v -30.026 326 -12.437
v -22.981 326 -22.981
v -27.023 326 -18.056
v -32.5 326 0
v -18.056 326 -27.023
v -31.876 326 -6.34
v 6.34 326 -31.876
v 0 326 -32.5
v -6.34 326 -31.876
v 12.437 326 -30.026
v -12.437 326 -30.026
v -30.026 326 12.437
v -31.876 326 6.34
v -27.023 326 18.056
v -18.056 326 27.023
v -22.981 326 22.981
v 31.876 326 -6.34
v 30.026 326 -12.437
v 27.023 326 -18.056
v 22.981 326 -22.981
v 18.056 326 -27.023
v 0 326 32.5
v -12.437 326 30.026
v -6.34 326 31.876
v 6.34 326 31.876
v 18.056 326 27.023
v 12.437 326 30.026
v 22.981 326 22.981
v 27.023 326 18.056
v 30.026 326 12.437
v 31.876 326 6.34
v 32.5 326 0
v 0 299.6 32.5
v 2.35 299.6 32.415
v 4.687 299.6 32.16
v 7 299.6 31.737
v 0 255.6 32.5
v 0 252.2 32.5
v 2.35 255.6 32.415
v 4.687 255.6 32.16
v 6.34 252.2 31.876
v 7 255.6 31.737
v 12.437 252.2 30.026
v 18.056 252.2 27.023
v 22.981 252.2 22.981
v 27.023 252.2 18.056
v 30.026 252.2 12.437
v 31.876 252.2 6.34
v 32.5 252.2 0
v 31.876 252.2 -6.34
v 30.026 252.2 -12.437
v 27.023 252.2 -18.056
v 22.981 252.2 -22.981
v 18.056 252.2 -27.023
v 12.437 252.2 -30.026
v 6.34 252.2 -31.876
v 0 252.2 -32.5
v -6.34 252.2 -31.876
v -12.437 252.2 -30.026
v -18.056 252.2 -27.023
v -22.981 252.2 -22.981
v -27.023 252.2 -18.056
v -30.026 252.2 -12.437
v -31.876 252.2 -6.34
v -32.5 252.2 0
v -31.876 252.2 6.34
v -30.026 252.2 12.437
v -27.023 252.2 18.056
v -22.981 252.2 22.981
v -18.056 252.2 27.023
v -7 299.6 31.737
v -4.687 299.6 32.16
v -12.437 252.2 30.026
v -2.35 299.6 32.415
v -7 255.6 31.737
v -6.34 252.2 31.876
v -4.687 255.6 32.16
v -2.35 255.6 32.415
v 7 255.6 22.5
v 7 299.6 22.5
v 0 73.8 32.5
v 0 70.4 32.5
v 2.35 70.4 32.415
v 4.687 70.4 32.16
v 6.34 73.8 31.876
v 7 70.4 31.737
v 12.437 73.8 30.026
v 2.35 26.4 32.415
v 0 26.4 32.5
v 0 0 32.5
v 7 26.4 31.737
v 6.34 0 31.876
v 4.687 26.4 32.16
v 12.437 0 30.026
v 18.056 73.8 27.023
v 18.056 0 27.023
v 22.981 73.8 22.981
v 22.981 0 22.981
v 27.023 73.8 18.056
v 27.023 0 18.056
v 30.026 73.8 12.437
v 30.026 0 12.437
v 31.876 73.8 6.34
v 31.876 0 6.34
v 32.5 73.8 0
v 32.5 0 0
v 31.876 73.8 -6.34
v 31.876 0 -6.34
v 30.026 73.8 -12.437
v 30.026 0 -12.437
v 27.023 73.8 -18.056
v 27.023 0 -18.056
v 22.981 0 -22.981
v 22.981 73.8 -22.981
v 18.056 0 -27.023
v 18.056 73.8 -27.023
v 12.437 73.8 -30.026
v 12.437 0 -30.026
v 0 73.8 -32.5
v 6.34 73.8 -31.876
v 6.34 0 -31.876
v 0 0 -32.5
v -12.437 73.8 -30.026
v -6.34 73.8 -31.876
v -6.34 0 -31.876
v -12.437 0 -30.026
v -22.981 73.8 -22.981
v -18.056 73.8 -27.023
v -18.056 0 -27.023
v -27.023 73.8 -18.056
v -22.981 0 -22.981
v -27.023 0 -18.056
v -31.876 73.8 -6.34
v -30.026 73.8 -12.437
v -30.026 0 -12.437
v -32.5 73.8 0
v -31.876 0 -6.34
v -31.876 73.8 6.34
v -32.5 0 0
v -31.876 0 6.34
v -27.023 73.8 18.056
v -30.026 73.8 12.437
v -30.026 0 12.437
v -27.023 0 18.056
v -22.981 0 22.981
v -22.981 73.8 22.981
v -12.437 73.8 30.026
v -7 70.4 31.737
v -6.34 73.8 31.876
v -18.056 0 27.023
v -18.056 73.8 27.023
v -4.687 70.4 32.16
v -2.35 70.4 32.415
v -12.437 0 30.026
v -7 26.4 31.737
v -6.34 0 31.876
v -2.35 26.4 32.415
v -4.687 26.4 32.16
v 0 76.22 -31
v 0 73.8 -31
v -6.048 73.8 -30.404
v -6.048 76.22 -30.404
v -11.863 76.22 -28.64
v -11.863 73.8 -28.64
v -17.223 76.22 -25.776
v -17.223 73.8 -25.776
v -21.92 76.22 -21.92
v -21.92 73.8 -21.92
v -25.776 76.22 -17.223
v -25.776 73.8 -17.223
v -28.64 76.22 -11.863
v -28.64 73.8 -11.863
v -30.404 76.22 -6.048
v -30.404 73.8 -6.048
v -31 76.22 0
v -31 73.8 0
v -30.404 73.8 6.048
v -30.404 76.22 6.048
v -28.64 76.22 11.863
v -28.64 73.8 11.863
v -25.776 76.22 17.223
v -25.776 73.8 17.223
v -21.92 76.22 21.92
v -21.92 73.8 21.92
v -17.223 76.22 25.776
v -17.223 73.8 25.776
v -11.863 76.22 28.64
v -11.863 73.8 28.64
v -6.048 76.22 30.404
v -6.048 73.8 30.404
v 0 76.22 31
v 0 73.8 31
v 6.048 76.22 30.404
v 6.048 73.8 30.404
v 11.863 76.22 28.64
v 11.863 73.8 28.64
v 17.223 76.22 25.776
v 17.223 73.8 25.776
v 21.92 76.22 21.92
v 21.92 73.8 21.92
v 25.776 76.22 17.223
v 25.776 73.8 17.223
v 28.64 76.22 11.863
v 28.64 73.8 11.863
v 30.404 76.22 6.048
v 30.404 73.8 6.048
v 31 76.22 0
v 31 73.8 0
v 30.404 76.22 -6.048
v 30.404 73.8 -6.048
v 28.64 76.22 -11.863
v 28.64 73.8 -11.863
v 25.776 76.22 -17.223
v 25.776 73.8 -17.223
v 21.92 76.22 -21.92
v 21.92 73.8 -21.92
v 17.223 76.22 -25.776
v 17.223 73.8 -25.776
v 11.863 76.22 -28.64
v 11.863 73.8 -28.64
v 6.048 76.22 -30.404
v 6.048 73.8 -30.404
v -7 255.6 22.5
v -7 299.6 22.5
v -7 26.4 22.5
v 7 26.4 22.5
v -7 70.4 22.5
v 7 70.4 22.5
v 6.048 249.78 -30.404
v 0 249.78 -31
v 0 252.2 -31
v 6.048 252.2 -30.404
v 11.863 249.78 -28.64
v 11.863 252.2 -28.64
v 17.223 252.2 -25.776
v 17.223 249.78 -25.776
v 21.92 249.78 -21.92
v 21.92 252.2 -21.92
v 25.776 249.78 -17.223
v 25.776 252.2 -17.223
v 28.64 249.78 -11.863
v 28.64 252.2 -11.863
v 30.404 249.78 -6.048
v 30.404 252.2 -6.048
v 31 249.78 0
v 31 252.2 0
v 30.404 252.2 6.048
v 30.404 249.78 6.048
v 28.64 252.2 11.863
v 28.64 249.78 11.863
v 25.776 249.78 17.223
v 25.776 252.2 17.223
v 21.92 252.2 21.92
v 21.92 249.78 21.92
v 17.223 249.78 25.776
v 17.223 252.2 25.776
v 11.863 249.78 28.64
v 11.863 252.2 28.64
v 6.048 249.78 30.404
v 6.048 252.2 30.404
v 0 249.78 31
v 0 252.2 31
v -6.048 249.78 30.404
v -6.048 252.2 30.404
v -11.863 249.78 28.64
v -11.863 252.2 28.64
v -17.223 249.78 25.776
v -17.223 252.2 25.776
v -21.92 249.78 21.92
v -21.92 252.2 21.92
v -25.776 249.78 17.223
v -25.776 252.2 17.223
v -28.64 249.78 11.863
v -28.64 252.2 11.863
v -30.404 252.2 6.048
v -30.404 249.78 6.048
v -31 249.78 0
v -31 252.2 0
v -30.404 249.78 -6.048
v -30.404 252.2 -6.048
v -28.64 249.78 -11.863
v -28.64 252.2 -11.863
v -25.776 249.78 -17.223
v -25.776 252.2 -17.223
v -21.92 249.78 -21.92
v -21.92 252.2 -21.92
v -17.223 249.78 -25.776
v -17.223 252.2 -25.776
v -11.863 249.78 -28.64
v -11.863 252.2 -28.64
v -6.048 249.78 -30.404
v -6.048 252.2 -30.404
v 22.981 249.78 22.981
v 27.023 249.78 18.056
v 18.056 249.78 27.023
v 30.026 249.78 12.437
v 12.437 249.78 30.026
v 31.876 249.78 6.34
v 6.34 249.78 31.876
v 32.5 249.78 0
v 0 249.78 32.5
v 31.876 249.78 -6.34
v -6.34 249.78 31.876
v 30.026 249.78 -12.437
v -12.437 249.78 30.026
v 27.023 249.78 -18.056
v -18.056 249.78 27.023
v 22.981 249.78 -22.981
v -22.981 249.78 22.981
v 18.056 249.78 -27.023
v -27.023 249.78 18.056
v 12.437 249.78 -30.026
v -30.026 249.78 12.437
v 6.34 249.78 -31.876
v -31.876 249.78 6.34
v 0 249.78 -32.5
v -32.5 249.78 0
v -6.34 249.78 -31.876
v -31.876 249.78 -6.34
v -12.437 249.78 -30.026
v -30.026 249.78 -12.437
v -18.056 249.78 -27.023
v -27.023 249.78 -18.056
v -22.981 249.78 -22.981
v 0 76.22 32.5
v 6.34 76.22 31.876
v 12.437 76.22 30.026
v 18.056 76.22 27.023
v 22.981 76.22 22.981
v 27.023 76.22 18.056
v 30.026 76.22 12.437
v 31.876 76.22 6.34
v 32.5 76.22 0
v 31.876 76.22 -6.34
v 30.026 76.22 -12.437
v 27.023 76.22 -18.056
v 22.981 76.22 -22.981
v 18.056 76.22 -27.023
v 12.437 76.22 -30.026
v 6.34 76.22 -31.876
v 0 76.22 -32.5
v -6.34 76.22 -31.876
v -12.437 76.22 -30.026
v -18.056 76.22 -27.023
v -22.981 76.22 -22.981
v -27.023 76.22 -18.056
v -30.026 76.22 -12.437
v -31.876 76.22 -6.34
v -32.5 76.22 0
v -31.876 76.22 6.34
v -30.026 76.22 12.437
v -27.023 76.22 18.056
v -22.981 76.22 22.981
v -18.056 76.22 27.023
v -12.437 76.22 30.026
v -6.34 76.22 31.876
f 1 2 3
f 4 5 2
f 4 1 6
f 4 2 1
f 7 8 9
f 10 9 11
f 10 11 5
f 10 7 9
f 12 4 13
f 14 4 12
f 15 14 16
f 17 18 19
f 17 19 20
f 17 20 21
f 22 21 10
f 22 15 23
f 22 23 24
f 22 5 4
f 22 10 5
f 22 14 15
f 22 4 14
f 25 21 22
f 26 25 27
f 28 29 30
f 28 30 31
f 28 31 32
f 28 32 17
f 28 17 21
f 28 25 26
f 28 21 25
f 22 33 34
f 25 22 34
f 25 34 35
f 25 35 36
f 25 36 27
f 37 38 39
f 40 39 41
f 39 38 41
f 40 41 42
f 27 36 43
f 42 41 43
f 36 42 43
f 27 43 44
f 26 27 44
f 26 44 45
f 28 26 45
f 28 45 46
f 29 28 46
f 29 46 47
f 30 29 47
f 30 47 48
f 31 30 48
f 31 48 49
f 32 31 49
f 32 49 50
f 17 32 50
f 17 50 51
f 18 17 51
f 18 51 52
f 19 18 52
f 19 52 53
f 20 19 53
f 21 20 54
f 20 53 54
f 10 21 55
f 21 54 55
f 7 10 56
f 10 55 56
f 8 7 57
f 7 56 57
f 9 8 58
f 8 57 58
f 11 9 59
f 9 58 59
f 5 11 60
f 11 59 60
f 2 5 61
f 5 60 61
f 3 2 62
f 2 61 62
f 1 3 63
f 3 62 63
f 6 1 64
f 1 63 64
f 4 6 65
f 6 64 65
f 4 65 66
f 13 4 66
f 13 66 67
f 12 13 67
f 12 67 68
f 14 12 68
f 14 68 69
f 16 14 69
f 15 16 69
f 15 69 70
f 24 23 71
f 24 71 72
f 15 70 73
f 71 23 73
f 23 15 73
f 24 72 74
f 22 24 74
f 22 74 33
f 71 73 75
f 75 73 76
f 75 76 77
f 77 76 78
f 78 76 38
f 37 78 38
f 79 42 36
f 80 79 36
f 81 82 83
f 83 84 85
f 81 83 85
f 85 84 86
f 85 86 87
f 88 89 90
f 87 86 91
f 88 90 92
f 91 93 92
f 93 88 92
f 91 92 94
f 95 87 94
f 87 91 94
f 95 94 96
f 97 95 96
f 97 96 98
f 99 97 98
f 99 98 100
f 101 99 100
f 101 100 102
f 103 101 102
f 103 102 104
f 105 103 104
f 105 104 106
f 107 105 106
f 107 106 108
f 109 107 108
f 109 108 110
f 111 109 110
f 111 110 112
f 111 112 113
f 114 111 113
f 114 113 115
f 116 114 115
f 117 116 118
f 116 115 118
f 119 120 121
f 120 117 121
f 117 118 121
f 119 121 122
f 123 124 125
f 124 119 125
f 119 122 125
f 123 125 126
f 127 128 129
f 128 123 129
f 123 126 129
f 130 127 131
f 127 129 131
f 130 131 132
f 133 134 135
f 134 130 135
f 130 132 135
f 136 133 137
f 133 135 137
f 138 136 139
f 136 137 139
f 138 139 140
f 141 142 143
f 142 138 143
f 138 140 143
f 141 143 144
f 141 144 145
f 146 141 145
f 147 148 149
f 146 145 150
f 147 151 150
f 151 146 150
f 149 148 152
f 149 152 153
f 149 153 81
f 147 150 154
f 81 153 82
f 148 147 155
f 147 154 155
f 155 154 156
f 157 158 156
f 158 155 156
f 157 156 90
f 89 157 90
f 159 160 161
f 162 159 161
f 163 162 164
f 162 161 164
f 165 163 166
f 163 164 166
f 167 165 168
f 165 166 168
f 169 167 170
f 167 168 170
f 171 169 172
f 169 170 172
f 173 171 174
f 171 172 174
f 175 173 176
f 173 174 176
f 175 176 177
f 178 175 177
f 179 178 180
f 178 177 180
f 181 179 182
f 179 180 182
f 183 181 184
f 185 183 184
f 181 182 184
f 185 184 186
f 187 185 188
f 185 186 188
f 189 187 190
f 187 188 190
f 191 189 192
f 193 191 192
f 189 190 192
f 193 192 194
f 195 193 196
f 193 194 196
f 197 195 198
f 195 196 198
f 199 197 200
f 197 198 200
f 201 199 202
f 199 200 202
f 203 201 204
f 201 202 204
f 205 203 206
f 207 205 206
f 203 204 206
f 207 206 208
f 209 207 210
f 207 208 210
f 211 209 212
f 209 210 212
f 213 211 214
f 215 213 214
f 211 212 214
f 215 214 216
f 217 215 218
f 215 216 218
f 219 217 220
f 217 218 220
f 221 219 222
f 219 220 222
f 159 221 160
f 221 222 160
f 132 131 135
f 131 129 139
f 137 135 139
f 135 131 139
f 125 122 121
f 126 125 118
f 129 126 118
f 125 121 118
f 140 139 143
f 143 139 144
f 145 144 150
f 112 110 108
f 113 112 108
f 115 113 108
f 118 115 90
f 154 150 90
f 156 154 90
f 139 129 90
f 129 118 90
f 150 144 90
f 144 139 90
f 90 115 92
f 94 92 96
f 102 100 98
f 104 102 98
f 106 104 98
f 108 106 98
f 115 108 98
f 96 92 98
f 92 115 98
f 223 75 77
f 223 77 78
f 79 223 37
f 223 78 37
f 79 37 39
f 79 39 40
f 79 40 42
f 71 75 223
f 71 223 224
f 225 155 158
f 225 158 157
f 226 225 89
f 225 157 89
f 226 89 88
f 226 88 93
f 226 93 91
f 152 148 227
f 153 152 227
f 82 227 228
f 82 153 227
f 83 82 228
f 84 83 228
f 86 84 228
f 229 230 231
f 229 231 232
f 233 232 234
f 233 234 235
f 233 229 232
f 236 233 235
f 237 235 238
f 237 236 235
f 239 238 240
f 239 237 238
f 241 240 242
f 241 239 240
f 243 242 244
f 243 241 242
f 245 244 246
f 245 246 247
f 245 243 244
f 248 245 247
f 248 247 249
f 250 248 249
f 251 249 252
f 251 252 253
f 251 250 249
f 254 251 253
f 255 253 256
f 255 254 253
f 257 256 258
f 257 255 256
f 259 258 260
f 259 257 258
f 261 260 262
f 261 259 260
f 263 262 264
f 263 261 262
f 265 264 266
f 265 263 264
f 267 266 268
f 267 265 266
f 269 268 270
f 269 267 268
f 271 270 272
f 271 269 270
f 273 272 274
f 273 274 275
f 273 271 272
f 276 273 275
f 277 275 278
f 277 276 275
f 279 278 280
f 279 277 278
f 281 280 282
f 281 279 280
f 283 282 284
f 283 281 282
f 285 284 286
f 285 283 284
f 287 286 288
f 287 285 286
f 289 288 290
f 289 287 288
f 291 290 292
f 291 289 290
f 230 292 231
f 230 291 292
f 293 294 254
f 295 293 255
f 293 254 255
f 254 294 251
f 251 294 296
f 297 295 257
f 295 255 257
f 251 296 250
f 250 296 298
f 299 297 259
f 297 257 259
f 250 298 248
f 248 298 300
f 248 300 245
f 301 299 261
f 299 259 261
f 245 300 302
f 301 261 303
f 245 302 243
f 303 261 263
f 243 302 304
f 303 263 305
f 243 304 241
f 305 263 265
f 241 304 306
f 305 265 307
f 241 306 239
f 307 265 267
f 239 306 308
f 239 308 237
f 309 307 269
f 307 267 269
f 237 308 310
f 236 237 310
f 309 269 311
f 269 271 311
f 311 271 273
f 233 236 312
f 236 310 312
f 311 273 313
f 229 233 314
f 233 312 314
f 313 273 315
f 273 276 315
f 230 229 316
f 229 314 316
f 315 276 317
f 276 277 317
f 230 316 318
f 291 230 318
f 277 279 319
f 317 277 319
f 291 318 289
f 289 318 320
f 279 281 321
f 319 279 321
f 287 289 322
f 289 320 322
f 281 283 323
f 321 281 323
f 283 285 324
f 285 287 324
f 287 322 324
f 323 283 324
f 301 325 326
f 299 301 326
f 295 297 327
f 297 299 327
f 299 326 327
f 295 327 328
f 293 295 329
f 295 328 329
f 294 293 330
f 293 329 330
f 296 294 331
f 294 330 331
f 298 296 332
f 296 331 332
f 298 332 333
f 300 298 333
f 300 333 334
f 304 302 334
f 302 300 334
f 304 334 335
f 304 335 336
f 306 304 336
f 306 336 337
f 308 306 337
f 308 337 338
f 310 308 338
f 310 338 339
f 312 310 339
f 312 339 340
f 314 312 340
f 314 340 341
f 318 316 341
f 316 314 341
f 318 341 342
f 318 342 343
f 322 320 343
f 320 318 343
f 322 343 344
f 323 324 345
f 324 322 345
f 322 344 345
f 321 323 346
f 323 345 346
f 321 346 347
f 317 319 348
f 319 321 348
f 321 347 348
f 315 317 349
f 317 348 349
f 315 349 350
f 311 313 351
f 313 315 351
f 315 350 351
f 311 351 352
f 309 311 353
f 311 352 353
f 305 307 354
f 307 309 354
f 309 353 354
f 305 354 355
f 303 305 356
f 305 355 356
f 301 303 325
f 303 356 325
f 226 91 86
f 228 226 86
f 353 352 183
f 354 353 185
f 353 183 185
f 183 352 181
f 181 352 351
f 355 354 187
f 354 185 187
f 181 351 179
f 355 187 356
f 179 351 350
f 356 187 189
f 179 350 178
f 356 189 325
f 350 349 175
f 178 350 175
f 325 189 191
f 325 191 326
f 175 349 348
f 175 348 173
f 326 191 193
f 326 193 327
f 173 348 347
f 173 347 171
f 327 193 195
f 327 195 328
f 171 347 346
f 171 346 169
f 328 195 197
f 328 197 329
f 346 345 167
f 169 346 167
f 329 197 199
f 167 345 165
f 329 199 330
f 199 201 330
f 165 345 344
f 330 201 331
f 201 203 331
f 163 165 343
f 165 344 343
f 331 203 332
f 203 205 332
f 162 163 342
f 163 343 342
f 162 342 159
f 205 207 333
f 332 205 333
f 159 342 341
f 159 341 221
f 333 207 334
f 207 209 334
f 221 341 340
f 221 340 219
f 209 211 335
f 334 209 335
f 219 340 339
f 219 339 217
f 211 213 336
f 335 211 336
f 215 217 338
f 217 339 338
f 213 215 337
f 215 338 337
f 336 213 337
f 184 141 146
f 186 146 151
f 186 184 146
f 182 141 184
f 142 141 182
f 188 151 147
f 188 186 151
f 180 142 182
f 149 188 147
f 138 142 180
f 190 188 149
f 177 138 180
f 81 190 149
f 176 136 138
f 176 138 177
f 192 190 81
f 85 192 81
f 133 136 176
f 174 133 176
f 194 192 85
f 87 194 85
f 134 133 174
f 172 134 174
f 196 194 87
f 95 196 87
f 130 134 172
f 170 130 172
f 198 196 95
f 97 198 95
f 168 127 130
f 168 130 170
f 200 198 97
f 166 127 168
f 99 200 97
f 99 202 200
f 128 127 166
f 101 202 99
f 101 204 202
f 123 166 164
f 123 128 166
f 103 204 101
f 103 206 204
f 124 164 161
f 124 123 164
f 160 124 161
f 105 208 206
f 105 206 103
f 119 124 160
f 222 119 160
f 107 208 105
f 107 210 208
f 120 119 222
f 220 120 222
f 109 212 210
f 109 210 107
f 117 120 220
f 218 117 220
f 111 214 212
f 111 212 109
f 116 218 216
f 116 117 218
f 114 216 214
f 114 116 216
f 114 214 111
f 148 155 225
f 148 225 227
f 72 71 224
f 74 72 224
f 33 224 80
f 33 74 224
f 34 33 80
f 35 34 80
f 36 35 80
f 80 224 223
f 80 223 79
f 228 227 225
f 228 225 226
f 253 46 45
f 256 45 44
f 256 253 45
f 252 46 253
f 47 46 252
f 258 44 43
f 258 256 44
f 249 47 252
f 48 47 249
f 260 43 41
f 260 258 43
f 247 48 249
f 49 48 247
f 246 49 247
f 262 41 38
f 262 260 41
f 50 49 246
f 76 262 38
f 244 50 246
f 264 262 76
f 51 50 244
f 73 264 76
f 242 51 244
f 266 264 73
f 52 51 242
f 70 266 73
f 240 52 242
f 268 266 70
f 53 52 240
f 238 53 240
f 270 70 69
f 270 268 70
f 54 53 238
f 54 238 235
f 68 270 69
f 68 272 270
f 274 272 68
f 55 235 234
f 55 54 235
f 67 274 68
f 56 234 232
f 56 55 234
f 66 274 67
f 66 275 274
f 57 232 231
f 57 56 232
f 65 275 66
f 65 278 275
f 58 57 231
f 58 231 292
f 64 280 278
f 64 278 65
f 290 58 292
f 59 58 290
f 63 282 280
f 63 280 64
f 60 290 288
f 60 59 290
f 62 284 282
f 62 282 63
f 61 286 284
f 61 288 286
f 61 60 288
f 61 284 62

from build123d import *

# Parameters (mm, degrees)
SKETCH1_R           = 32.5
BOSS_EXTRUDE1_DEPTH = 326
SKETCH2_R           = 53.453114337
SKETCH2_R_2         = 31
CUT_EXTRUDE1_DEPTH  = 2.42
CUT_EXTRUDE2_START  = 2.42
SKETCH3_R           = 95.953037666
SKETCH3_R_2         = 31
CUT_EXTRUDE2_DEPTH  = 2.42
SKETCH5_W           = 14
SKETCH5_H           = 44
CUT_EXTRUDE3_DEPTH  = 10


with BuildPart() as part:
    # Sketch1 → Boss-Extrude1 (new body)
    with BuildSketch(Plane(origin=(0, 0, 0), x_dir=(1, 0, 0), z_dir=(0, 1, 0))):
        Circle(SKETCH1_R)
    extrude(amount=BOSS_EXTRUDE1_DEPTH)

    # Sketch2 → Cut-Extrude1 (cut)
    with BuildSketch(Plane(origin=(0, 73.8, 0), x_dir=(1, 0, 0), z_dir=(0, 1, 0))):
        Circle(SKETCH2_R)
        Circle(SKETCH2_R_2, mode=Mode.SUBTRACT)
    extrude(amount=CUT_EXTRUDE1_DEPTH, mode=Mode.SUBTRACT)

    # Sketch3 → Cut-Extrude2 (cut)
    with BuildSketch(Plane(origin=(0, 252.2, 0), x_dir=(-1, 0, 0), z_dir=(0, -1, 0)).offset(CUT_EXTRUDE2_START)):
        Circle(SKETCH3_R)
        Circle(SKETCH3_R_2, mode=Mode.SUBTRACT)
    extrude(amount=-CUT_EXTRUDE2_DEPTH, mode=Mode.SUBTRACT)

    # Sketch5 → Cut-Extrude3 (cut)
    with BuildSketch(Plane.XY.offset(32.5)):
        with Locations((0, 277.6)):
            Rectangle(SKETCH5_W, SKETCH5_H)
        with Locations((0, 48.4)):
            Rectangle(SKETCH5_W, SKETCH5_H)
    extrude(amount=-CUT_EXTRUDE3_DEPTH, mode=Mode.SUBTRACT)


solid = part.part
